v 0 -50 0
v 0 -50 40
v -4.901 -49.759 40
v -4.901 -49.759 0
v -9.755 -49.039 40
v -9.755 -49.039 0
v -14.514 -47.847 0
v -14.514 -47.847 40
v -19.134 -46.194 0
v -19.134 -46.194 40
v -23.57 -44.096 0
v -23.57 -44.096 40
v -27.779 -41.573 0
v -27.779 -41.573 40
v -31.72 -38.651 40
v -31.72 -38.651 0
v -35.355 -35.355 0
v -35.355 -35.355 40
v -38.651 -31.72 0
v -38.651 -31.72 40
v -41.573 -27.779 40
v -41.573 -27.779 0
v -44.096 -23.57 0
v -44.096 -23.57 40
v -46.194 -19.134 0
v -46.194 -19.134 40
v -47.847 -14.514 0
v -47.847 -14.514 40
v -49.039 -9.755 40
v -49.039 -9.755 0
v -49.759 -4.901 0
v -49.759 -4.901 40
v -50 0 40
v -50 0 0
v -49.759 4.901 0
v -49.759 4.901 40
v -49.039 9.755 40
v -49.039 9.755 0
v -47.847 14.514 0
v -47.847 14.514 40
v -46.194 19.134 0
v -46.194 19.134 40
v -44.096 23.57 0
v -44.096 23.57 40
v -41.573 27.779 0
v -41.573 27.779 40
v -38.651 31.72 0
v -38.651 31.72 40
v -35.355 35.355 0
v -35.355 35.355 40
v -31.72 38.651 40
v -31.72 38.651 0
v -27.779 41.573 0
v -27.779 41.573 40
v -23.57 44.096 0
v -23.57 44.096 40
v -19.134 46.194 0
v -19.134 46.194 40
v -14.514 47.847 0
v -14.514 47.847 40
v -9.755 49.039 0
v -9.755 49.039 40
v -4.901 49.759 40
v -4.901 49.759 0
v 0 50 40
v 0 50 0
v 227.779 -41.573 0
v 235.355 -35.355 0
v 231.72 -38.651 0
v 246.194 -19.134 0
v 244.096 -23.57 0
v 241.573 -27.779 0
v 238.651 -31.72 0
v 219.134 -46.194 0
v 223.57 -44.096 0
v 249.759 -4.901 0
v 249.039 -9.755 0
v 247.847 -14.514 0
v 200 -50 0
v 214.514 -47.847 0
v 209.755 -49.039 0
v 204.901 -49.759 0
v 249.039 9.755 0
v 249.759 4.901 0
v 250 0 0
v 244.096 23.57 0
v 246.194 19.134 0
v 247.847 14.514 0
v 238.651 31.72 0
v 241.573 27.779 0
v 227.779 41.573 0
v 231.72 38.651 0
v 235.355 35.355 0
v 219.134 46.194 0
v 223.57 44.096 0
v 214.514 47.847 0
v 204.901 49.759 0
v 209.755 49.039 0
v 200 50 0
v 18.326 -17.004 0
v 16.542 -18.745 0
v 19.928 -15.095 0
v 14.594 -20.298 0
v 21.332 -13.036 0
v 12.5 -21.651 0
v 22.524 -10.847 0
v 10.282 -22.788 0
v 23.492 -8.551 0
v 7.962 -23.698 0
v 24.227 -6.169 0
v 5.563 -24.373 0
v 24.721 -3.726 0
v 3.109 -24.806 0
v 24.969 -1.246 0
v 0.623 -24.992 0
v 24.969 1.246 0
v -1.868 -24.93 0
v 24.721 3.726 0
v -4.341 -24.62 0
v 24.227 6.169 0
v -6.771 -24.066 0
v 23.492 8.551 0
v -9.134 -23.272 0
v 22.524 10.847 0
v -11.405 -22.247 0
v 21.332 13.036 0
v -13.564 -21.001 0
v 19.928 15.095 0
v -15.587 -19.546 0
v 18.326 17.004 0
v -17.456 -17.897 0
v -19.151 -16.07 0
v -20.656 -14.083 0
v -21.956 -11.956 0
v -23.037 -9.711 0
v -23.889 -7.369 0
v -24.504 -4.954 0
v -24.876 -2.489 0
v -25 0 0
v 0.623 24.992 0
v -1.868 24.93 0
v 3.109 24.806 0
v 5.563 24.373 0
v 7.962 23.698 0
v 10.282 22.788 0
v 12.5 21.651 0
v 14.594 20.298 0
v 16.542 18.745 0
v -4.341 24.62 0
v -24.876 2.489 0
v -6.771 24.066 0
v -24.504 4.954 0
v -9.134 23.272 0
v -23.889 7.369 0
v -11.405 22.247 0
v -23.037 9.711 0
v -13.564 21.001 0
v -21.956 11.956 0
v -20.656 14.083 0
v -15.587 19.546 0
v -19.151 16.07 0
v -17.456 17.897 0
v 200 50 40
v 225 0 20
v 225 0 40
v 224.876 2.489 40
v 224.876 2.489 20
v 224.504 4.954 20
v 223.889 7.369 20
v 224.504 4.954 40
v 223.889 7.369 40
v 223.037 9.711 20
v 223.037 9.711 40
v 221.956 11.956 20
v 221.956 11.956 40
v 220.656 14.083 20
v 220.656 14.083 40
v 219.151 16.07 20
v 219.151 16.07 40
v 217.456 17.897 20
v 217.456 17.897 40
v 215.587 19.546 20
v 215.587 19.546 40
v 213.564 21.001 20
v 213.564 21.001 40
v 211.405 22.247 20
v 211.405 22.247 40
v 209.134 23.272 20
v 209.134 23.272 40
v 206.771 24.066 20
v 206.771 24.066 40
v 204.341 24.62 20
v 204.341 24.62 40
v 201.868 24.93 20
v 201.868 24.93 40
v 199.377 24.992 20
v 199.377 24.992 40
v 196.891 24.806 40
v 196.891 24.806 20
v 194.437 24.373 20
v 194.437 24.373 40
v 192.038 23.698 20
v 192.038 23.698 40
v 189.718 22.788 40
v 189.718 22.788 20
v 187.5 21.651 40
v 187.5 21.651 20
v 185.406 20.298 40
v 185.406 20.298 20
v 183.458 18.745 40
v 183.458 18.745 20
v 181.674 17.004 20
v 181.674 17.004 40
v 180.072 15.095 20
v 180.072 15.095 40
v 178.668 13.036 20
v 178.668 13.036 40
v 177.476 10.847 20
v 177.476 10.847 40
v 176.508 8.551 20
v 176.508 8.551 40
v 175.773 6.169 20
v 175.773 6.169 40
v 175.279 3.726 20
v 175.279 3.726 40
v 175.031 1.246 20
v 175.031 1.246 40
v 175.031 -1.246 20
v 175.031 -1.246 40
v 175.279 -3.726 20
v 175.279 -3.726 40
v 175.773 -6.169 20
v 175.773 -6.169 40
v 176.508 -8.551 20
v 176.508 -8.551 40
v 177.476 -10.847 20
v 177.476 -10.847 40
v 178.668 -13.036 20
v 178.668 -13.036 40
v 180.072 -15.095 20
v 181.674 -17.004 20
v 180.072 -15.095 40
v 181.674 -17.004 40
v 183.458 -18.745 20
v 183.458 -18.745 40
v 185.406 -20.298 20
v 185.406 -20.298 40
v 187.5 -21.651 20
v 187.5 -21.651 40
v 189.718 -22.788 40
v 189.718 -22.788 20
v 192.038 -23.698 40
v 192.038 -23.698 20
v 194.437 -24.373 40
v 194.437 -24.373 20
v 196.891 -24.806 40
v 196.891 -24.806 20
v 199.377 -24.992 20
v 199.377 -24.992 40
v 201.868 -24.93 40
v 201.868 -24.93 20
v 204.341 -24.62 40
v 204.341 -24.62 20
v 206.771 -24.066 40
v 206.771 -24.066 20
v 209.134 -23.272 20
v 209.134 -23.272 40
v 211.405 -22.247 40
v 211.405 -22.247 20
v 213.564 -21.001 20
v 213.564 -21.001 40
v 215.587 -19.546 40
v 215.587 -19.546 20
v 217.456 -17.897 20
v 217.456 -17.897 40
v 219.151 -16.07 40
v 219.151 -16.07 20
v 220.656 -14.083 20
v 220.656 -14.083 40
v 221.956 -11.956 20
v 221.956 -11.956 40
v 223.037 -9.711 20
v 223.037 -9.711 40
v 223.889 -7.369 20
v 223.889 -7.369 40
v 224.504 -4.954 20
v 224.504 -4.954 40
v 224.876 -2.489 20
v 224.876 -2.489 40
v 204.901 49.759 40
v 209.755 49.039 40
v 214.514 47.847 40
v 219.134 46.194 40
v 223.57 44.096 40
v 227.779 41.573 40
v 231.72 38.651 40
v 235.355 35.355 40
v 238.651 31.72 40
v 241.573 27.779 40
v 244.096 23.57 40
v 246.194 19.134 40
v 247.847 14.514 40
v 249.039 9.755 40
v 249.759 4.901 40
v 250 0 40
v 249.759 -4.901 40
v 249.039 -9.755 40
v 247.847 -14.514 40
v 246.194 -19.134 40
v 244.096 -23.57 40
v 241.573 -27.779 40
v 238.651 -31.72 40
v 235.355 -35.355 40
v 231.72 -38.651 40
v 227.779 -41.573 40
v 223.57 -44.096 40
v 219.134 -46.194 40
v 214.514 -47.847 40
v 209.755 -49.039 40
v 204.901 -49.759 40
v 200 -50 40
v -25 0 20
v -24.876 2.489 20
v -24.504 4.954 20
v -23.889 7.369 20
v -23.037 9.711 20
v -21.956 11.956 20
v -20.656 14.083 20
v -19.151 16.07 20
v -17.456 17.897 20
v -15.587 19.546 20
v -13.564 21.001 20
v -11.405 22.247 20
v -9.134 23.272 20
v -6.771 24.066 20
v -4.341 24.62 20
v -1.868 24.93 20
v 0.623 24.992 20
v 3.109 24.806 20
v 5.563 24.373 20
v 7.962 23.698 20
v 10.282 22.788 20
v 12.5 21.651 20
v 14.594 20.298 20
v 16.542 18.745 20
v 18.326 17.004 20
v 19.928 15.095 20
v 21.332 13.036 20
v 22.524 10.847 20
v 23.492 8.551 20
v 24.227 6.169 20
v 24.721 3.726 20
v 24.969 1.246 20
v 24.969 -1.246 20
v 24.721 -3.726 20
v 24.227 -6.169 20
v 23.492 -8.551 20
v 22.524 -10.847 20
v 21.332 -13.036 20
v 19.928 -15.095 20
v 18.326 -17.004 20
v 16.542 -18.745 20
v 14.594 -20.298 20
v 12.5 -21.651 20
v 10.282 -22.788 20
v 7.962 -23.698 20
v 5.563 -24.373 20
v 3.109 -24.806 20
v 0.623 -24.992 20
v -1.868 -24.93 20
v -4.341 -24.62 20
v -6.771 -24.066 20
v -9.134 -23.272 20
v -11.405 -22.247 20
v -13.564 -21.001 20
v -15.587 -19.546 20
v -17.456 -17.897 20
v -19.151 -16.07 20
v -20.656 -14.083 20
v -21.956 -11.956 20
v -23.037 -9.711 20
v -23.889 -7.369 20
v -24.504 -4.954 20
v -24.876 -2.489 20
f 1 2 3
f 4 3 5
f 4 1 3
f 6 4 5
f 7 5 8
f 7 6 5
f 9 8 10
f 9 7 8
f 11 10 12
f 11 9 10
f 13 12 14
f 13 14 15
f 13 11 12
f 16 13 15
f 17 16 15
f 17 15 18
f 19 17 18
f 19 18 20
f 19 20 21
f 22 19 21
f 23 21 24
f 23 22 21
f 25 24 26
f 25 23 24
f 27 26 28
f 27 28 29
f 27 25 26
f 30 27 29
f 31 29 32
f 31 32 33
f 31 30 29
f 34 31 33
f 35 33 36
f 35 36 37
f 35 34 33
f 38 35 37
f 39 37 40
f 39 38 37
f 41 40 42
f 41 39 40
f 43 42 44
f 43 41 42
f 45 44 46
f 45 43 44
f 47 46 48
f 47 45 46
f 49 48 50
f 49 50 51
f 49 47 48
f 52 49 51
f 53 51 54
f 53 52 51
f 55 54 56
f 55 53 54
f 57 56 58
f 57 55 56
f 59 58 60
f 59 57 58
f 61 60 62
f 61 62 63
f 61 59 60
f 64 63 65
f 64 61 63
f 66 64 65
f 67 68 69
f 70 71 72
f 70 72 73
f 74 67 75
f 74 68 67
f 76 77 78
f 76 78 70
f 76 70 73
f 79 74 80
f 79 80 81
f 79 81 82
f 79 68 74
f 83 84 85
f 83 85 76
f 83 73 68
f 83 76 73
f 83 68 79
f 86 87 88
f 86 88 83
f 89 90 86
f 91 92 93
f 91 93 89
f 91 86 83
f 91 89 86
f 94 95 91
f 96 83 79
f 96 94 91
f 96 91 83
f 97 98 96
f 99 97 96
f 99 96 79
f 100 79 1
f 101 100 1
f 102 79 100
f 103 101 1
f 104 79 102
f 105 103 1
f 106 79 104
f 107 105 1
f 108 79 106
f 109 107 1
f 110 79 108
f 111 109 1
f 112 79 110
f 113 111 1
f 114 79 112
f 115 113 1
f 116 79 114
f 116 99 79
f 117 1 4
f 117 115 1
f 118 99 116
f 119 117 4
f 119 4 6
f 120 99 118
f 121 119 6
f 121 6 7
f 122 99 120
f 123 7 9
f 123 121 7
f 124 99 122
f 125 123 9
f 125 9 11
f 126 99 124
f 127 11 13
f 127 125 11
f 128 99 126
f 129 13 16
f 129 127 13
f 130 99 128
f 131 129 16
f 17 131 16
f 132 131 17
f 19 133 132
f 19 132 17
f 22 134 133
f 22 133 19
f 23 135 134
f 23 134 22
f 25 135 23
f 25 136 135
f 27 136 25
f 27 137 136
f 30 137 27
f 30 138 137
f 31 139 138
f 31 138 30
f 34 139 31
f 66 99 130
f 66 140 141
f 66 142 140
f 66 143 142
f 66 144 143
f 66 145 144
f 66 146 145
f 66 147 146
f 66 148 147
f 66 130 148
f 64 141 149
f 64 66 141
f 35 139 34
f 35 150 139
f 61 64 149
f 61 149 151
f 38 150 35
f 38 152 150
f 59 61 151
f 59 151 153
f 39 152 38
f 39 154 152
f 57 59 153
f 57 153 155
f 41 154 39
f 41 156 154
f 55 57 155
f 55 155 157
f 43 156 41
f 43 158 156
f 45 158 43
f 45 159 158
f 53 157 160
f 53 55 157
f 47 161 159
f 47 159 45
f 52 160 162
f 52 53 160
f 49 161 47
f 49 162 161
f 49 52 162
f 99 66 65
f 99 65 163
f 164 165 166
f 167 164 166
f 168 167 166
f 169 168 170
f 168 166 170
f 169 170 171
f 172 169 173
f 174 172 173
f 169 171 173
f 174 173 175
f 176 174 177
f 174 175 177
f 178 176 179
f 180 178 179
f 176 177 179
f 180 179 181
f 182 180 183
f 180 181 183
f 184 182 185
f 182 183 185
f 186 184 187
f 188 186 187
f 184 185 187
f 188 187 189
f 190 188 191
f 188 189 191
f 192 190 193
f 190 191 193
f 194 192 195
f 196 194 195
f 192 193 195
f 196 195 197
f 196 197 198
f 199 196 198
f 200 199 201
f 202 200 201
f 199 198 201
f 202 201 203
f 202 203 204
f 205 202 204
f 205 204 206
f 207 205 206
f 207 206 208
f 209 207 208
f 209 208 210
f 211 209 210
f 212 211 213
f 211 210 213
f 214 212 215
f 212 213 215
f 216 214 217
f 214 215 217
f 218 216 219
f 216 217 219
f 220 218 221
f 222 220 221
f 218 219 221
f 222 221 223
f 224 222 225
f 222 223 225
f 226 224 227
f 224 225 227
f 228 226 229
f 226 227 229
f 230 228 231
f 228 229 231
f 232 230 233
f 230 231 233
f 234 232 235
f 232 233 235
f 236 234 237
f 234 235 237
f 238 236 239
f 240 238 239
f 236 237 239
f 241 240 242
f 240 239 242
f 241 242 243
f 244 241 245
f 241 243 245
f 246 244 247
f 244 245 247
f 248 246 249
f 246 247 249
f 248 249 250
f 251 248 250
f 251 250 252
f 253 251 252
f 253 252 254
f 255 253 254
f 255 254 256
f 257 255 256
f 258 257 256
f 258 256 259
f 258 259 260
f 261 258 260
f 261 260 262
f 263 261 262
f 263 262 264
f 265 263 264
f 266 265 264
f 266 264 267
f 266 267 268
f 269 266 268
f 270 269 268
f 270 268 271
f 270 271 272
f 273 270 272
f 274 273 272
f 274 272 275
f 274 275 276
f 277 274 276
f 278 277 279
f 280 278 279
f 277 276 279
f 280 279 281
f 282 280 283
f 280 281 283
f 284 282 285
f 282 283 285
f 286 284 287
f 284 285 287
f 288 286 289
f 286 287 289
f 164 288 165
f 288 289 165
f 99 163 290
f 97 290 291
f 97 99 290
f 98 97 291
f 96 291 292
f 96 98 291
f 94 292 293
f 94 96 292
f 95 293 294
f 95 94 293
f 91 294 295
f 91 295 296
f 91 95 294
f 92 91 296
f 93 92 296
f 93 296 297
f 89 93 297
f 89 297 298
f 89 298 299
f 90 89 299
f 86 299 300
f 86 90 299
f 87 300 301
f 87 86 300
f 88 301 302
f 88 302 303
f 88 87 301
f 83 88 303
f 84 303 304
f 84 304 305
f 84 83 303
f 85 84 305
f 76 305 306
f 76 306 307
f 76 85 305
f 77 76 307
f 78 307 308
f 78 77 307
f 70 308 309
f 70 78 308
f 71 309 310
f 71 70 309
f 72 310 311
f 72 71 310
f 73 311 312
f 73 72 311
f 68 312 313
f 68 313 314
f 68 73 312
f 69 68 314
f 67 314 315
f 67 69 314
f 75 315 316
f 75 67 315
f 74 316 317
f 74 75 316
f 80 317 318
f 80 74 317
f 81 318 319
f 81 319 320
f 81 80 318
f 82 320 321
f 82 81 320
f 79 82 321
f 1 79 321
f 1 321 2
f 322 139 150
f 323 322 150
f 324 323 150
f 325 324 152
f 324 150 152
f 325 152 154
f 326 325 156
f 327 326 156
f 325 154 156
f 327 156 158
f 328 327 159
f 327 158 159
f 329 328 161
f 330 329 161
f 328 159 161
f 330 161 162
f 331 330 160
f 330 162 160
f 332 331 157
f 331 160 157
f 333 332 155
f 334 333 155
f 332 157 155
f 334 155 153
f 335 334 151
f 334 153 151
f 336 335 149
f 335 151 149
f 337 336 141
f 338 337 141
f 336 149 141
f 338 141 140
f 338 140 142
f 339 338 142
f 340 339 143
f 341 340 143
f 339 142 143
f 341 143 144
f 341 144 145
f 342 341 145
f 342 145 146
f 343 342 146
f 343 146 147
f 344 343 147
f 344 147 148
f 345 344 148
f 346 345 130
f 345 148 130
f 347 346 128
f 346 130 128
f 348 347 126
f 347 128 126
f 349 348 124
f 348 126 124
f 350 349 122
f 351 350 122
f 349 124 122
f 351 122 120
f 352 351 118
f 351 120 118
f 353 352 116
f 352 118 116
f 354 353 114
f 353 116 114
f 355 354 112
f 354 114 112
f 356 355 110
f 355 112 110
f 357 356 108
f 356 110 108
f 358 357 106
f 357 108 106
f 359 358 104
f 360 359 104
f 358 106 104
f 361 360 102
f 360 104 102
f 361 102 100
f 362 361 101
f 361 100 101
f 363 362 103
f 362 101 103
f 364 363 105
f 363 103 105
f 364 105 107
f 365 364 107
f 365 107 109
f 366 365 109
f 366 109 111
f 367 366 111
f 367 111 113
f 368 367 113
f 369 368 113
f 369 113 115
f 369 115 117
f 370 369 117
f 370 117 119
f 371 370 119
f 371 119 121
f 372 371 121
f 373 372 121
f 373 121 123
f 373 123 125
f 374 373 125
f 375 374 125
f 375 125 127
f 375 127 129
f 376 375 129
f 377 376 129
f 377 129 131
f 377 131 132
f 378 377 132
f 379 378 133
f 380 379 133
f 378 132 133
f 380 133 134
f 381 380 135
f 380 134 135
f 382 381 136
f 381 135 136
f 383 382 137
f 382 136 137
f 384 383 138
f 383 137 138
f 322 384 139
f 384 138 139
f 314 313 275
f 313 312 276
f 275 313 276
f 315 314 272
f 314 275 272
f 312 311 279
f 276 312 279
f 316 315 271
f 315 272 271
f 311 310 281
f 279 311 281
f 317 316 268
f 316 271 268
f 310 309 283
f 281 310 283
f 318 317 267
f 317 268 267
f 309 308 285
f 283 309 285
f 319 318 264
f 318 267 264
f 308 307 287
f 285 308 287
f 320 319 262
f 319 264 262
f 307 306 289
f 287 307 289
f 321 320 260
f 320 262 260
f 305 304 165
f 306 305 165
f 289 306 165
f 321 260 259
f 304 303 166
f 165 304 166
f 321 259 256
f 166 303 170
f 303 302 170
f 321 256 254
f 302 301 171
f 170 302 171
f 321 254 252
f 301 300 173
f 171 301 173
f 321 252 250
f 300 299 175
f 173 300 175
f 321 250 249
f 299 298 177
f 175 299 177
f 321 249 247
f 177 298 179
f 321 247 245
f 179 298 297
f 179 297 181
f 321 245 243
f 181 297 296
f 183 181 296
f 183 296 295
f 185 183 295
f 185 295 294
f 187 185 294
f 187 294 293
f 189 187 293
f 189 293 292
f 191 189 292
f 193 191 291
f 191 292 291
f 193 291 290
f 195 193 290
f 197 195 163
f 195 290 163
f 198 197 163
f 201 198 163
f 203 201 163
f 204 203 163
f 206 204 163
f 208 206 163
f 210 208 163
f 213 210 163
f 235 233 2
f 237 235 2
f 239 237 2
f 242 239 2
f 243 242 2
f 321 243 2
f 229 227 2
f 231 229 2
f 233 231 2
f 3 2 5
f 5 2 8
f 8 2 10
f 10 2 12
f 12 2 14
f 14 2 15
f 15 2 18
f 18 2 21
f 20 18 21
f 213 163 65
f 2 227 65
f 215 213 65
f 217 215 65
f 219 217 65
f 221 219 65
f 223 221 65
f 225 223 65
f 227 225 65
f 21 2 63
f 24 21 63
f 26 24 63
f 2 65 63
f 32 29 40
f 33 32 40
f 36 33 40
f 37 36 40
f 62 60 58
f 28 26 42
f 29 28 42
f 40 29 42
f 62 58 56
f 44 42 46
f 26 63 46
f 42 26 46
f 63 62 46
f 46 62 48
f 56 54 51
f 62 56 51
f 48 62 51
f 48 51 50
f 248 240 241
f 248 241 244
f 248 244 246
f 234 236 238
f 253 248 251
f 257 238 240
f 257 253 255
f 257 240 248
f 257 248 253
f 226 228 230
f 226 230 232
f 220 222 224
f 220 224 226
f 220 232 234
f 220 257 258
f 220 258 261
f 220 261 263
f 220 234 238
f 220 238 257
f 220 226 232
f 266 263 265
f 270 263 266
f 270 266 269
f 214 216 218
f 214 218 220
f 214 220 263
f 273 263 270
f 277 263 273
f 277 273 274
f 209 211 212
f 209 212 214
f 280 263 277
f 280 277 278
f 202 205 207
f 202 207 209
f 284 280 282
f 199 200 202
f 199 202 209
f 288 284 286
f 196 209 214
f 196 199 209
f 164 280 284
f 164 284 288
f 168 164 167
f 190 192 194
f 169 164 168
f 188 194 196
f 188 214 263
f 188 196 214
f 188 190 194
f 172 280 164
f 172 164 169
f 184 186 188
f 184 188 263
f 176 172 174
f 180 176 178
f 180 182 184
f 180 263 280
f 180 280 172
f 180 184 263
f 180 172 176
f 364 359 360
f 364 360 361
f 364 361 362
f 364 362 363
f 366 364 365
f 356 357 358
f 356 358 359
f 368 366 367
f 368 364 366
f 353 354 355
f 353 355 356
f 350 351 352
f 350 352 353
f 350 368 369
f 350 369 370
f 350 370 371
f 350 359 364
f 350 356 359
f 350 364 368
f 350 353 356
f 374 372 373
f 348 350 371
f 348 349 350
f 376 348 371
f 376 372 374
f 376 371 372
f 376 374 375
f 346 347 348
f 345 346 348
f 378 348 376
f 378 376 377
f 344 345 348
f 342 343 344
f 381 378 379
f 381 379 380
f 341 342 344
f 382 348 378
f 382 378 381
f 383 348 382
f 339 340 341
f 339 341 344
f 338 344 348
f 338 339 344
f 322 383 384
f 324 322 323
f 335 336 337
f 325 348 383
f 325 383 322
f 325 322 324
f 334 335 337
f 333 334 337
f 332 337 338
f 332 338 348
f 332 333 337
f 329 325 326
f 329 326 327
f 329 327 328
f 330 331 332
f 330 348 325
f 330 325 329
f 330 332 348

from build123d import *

# Parameters (mm, degrees)
EXTRUDE_1_DEPTH     = 40
SKETCH_2_R          = 25
CUT_EXTRUDE_1_DEPTH = 20
SKETCH_3_R          = 25
CUT_EXTRUDE_2_DEPTH = 20


with BuildPart() as part:
    # 草图1 → 凸台-拉伸1 (new body)
    with BuildSketch(Plane.XY):
        with BuildLine():
            Line((0, 50), (200, 50))
            ThreePointArc((200, 50), (250, 0), (200, -50))
            Line((200, -50), (0, -50))
            ThreePointArc((0, -50), (-50, 0), (0, 50))
        make_face()
    extrude(amount=EXTRUDE_1_DEPTH)

    # 草图2 → 切除-拉伸1 (cut)
    with BuildSketch(Plane(origin=(0, 0, 0), x_dir=(-1, 0, 0), z_dir=(0, 0, -1))):
        Circle(SKETCH_2_R)
    extrude(amount=-CUT_EXTRUDE_1_DEPTH, mode=Mode.SUBTRACT)

    # 草图3 → 切除-拉伸2 (cut)
    with BuildSketch(Plane.XY.offset(40)):
        with Locations((200, 0)):
            Circle(SKETCH_3_R)
    extrude(amount=-CUT_EXTRUDE_2_DEPTH, mode=Mode.SUBTRACT)


solid = part.part
